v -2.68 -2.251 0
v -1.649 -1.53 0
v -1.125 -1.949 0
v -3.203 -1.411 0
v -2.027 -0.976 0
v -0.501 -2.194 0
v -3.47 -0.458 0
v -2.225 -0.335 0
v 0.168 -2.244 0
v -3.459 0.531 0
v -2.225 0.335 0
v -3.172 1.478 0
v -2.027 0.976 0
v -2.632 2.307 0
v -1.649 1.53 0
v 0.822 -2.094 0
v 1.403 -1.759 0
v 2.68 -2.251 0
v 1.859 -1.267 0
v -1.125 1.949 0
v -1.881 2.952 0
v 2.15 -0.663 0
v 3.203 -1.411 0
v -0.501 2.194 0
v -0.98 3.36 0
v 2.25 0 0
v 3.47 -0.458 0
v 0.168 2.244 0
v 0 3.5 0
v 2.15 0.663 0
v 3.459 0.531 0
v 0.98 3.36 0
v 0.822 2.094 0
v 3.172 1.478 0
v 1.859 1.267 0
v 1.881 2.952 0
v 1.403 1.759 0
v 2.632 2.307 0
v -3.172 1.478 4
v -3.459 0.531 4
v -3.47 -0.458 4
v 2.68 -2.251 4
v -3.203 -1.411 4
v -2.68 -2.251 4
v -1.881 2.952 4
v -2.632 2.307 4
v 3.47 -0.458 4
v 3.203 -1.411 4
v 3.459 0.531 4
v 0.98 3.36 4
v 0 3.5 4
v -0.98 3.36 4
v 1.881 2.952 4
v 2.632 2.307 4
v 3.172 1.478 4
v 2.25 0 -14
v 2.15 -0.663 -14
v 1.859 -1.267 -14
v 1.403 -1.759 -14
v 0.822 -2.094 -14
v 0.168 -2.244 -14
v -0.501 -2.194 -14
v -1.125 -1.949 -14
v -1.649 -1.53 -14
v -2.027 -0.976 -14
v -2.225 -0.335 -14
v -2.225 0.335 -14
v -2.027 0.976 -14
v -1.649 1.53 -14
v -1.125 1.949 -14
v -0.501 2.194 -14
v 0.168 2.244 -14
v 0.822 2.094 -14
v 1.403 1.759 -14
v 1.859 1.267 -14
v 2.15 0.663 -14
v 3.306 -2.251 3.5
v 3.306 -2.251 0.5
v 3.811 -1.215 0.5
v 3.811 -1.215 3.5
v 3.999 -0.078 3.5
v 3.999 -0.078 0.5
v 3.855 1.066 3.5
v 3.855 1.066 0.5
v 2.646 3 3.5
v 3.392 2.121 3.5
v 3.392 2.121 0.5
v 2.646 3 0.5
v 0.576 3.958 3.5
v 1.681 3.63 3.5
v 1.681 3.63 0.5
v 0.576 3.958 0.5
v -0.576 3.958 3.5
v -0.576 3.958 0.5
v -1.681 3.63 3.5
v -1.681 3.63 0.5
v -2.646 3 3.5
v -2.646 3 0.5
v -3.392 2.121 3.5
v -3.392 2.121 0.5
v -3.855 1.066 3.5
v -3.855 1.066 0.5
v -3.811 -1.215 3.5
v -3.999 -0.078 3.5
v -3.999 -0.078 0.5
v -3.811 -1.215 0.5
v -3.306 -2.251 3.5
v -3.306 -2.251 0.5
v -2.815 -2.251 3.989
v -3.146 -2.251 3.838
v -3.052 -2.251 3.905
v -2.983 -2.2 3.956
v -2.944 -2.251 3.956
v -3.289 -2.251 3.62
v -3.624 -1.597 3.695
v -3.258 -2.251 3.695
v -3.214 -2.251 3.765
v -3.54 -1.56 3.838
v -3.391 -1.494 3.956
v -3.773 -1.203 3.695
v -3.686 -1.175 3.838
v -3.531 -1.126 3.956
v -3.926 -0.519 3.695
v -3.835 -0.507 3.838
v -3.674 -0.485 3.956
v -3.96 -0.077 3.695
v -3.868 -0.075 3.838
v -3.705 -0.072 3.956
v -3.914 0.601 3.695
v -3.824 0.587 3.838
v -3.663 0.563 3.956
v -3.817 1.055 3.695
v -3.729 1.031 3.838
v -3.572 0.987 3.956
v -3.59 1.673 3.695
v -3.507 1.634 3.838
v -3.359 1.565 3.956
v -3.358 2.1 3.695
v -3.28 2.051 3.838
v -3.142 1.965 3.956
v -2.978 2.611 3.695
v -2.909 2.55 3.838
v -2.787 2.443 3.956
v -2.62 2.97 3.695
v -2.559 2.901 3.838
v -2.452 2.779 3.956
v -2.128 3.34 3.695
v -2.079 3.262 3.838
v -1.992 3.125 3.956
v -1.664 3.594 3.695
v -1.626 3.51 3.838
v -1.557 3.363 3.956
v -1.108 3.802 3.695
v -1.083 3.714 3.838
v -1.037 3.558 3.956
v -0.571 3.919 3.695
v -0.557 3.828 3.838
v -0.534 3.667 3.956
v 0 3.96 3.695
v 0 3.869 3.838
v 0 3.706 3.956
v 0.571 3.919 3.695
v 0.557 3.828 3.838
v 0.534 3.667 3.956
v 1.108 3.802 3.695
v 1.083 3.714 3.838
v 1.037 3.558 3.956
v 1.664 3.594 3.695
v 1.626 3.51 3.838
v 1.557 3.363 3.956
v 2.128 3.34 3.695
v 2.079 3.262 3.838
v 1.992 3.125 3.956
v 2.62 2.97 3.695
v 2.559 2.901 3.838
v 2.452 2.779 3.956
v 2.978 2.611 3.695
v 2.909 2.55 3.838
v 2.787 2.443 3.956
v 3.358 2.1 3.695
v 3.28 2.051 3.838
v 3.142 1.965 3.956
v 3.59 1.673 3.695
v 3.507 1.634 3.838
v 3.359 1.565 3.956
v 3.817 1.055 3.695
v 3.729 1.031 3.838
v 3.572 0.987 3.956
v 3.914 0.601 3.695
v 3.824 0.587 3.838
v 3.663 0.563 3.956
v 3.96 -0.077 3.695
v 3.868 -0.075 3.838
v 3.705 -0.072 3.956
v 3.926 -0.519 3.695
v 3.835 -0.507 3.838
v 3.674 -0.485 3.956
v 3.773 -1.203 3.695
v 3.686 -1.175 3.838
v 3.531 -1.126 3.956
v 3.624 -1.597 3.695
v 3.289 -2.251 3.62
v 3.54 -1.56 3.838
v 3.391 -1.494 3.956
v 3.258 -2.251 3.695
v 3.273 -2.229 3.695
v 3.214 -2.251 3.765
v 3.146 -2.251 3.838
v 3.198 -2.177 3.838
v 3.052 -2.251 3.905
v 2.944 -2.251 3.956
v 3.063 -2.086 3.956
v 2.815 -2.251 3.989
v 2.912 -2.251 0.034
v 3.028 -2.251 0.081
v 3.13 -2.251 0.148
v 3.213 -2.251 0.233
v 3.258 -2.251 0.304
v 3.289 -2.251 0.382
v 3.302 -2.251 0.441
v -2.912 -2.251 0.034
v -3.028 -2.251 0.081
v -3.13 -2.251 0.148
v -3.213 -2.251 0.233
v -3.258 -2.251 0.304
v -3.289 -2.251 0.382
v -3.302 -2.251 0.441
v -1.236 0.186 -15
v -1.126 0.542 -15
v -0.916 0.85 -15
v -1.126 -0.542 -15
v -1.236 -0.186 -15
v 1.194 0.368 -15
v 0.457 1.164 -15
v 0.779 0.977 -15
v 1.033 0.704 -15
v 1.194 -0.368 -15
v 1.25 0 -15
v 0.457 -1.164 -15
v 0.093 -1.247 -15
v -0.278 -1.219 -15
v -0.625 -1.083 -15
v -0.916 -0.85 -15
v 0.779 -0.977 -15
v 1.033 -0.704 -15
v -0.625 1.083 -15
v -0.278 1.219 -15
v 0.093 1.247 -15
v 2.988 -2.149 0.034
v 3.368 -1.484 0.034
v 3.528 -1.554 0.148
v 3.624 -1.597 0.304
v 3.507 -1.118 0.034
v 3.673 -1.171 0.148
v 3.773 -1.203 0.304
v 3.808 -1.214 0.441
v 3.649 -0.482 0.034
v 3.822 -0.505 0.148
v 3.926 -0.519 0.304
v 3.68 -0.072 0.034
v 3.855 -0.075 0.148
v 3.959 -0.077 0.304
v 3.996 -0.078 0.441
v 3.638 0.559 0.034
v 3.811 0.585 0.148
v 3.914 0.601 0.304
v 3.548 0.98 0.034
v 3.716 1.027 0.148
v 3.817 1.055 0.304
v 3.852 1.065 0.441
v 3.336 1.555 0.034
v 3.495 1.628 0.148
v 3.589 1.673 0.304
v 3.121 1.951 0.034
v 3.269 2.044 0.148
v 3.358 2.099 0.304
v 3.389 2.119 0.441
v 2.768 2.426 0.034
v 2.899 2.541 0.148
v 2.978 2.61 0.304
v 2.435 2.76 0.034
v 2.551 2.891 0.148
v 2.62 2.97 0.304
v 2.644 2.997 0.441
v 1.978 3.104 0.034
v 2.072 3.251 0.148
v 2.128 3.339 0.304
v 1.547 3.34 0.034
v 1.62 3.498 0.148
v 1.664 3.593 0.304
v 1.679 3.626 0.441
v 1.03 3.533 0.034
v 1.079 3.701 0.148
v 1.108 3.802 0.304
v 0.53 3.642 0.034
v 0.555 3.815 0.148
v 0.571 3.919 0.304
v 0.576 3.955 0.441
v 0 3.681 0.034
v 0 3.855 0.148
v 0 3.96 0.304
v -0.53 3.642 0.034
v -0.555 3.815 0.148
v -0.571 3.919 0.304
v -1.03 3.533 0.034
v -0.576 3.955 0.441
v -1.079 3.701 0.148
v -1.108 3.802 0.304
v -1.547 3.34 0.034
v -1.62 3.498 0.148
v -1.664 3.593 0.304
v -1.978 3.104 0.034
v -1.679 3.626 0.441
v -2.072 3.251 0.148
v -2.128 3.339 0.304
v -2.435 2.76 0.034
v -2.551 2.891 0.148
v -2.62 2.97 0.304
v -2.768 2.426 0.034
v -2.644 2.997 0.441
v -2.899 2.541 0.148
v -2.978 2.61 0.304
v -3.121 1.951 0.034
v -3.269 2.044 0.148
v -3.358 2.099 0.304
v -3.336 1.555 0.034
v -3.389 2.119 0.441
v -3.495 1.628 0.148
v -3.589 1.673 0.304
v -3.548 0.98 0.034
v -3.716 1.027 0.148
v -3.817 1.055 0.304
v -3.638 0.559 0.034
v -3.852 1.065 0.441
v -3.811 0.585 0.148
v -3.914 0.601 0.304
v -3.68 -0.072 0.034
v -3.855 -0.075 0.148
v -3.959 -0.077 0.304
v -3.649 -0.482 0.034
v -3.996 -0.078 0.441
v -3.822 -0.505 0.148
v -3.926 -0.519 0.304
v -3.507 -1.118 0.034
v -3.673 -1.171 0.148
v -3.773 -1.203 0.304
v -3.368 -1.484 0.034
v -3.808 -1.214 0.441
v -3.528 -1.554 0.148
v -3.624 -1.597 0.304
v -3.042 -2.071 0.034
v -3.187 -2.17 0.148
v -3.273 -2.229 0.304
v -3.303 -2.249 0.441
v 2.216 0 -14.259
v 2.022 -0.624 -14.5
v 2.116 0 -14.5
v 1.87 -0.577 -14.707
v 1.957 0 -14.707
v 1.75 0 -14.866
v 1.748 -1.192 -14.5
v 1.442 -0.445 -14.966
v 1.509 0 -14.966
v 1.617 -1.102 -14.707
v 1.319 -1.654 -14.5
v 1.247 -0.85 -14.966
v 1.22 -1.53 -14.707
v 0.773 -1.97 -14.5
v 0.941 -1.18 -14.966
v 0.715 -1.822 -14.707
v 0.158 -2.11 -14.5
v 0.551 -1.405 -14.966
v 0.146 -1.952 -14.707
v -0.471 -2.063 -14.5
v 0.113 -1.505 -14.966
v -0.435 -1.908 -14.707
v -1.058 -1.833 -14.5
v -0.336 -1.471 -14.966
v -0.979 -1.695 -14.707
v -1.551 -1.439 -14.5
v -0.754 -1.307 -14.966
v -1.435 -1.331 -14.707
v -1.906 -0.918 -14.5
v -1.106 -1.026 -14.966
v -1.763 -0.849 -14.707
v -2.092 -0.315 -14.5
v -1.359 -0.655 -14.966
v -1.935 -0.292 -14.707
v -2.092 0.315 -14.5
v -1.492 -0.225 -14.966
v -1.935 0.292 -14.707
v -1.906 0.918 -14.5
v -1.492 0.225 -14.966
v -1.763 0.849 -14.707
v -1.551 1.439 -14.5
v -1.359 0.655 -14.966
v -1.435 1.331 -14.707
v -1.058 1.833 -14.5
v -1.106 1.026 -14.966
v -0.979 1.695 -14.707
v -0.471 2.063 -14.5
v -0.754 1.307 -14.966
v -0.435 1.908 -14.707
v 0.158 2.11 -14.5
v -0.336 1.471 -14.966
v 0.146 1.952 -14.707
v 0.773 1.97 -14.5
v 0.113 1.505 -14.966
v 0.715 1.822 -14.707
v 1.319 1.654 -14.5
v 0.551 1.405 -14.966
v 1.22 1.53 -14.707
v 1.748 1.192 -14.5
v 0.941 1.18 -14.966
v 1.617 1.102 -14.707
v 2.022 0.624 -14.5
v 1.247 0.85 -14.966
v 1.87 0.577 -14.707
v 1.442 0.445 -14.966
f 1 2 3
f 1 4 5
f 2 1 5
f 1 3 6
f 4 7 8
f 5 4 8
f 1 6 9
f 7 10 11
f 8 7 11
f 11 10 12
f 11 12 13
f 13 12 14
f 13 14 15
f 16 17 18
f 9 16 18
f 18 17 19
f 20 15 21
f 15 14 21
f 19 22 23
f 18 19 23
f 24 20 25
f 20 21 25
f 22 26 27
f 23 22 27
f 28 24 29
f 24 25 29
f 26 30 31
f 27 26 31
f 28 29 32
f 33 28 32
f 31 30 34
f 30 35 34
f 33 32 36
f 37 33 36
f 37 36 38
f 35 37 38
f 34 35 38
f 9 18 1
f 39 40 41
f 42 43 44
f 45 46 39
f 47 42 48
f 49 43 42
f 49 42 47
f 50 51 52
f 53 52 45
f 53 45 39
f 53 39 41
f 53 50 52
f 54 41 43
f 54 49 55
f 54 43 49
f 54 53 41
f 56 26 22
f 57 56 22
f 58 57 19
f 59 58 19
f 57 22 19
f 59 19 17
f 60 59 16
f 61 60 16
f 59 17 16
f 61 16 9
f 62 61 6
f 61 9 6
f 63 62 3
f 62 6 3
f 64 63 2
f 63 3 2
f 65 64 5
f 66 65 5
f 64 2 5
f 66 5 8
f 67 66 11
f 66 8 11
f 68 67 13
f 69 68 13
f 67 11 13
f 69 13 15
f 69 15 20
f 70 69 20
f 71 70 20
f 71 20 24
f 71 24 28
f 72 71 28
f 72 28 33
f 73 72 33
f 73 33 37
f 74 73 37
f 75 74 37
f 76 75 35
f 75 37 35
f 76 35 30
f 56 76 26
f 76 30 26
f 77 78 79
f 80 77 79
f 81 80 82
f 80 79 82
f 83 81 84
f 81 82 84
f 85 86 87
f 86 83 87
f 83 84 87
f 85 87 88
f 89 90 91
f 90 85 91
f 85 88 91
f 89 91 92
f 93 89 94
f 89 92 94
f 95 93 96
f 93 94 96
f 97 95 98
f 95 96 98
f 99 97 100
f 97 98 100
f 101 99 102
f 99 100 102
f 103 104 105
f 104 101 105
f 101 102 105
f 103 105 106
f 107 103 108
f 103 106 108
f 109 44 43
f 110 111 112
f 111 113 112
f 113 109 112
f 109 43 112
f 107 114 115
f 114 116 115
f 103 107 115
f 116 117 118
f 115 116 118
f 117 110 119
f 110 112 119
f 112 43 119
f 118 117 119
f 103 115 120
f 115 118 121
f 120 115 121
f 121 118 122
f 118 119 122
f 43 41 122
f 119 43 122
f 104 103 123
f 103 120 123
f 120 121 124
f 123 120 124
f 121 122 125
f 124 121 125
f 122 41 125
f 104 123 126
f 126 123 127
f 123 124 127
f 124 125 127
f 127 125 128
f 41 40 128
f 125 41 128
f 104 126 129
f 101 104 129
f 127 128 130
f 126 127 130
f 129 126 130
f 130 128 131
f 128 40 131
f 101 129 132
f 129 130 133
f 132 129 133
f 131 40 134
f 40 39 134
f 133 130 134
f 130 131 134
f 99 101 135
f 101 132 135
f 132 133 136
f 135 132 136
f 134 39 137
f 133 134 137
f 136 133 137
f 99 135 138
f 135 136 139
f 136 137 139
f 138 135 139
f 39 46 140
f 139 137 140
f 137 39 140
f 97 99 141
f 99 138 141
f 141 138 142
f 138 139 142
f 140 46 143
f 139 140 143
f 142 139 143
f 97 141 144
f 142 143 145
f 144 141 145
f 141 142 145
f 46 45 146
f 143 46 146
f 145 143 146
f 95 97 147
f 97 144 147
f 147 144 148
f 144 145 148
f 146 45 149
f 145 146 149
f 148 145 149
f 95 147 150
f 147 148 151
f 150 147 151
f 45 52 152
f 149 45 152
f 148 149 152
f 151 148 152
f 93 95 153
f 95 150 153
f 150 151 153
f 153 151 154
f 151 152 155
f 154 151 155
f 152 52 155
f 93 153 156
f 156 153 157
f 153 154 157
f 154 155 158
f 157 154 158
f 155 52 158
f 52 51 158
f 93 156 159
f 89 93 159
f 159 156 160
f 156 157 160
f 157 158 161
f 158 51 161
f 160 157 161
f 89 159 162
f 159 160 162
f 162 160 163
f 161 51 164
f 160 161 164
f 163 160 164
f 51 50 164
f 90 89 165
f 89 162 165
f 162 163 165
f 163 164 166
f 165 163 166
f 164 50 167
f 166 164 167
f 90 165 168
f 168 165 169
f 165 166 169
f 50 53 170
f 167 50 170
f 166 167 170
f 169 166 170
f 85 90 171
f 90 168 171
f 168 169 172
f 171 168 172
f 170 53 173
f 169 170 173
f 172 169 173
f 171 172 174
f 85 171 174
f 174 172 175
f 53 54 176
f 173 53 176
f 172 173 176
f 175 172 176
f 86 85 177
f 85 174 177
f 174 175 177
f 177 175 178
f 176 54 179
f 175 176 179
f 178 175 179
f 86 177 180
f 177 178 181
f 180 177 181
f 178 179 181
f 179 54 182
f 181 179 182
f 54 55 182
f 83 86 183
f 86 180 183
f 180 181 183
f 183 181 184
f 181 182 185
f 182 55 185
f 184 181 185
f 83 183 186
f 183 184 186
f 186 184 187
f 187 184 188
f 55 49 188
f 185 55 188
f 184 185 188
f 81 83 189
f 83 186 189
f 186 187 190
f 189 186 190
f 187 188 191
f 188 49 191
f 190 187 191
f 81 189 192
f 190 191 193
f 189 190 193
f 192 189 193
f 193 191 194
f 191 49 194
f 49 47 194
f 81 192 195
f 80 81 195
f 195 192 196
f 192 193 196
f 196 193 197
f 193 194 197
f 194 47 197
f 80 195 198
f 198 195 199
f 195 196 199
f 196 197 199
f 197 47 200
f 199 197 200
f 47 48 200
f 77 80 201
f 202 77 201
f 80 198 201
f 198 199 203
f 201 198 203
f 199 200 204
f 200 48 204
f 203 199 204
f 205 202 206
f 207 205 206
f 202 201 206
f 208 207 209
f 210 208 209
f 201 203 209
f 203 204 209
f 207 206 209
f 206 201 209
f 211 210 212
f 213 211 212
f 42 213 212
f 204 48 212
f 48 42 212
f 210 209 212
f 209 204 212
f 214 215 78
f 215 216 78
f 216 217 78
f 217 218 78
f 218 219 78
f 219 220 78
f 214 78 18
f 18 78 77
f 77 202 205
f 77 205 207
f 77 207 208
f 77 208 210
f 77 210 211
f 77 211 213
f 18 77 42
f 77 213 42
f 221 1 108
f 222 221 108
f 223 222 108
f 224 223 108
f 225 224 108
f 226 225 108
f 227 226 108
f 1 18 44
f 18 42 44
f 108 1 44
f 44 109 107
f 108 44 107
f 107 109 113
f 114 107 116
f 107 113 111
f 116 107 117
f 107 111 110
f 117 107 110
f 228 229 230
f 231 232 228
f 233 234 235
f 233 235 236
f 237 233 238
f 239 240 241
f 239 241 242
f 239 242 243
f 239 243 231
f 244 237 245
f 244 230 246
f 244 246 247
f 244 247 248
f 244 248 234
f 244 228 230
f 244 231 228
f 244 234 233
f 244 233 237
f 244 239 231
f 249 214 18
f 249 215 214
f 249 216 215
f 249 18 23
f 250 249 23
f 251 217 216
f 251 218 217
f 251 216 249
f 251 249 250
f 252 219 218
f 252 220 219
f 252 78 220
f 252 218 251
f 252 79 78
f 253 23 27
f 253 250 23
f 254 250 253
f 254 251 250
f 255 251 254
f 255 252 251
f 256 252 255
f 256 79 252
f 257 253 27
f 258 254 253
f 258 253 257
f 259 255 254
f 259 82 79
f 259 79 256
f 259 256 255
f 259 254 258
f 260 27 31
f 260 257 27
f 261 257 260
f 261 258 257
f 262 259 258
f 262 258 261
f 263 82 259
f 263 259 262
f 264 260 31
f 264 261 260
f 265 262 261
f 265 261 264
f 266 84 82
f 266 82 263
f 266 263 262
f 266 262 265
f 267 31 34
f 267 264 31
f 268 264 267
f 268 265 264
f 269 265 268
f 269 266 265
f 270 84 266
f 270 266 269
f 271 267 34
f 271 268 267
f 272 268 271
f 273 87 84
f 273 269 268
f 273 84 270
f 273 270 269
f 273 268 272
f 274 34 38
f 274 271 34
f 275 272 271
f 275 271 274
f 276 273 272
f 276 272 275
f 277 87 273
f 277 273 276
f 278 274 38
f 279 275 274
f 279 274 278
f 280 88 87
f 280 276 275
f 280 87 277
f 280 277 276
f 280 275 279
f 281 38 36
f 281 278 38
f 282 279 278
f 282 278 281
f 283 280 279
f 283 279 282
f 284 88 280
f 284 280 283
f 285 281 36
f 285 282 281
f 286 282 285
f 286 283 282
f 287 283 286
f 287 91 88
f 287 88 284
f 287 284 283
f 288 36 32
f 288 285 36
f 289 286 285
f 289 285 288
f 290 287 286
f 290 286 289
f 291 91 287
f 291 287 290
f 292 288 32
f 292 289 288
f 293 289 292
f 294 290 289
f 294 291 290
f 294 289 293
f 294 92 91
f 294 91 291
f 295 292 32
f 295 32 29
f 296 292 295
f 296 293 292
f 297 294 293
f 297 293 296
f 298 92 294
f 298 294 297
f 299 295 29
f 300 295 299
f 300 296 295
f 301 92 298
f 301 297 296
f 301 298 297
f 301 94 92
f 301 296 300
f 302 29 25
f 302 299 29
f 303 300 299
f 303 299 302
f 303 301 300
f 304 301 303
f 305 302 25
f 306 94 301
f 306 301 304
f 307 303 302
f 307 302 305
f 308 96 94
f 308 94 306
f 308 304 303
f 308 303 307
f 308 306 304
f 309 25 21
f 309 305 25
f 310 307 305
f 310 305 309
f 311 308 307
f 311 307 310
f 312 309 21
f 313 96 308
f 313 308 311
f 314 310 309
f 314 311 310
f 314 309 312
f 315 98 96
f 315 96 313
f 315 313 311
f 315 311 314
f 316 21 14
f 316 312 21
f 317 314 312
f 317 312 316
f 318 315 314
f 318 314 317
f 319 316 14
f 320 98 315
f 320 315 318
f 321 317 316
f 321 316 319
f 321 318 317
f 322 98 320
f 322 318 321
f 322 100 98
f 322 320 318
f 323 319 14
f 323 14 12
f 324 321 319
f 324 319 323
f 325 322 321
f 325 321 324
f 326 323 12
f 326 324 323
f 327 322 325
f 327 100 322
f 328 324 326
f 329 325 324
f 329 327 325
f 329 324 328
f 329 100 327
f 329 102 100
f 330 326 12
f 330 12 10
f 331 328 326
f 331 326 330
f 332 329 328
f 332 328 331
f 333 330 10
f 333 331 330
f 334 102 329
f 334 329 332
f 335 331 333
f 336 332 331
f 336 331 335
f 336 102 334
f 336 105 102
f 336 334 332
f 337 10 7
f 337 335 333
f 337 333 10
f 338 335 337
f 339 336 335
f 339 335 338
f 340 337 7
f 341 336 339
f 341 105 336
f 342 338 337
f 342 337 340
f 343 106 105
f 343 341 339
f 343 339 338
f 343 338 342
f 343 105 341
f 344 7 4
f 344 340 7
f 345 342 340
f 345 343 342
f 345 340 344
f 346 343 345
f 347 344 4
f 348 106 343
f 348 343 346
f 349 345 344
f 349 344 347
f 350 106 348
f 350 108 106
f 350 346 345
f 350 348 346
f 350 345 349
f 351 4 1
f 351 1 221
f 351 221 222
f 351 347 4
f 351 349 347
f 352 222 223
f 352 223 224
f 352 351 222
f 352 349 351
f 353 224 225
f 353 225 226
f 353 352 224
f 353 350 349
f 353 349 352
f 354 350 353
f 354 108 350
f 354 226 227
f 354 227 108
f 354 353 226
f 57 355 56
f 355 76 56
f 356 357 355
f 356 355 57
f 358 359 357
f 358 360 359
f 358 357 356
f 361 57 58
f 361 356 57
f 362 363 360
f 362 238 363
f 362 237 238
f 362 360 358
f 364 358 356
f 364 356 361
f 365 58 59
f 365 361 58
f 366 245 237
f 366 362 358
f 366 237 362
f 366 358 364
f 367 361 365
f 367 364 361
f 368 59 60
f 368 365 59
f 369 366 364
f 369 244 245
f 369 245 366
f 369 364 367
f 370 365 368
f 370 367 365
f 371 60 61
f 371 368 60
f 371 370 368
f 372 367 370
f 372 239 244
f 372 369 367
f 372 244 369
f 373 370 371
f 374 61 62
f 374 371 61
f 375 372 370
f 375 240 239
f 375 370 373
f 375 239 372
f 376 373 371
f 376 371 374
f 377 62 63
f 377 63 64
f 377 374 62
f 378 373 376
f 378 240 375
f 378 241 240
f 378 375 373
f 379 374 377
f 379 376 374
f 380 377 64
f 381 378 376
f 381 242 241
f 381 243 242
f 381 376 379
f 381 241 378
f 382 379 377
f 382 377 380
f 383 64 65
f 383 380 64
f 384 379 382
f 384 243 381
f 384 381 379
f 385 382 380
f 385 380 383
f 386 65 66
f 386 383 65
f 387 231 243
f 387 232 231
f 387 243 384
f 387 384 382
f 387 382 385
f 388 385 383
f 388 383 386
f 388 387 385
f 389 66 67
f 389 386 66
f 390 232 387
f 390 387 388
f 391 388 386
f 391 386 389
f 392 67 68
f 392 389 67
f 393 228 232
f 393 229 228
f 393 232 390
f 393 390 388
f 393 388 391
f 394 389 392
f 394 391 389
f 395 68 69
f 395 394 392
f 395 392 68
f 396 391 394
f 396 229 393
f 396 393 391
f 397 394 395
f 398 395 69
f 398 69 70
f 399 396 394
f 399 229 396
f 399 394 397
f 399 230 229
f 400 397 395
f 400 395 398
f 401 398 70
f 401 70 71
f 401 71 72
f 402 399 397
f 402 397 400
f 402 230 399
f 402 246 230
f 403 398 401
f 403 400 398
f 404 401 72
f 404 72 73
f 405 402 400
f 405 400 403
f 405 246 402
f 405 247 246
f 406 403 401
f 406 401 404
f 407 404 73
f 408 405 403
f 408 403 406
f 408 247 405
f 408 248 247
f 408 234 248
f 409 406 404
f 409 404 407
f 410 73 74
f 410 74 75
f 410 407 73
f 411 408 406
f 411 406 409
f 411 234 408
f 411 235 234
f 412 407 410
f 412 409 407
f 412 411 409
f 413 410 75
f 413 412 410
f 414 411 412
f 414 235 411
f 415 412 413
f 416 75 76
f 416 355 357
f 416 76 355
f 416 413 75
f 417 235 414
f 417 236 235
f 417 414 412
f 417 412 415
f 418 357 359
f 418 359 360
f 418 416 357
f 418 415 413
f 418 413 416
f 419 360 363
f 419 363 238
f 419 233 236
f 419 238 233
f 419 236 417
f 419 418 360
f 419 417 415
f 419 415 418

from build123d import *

# Parameters (mm, degrees)
F0_R     = 4
F1_DEPTH = 4
F2_R     = 2.25
F3_DEPTH = 15
F5_DEPTH = 4
F6_R     = 1
F7_R     = 0.5


with BuildPart() as f1:
    # F0 (on Top) → F1 (new body)
    with BuildSketch(Plane.XY):
        Circle(F0_R)
    extrude(amount=F1_DEPTH)

    # F2 (on face) → F3 (join)
    with BuildSketch(Plane(origin=(0, 0, 0), x_dir=(1, 0, 0), z_dir=(0, 0, -1))):
        Circle(F2_R)
    extrude(amount=F3_DEPTH)

    # F4 (on face) → F5 (cut)
    with BuildSketch(Plane.XY.offset(4)):
        Polygon((5.111386, -2.251241), (-4.930368, -2.251241), (-2.237212, -4.44078), (3.483612, -4.44078), align=None)
    extrude(amount=-F5_DEPTH, mode=Mode.SUBTRACT)

    # F6
    f6_edges = [f1.edges().sort_by_distance(p)[0] for p in [
        (-2.25, 0, -15),
    ]]
    fillet(f6_edges, radius=F6_R)

    # F7
    f7_edges = [f1.edges().sort_by_distance(p)[0] for p in [
        (0, 4, 0),
        (0, 4, 4),
    ]]
    fillet(f7_edges, radius=F7_R)


solid = f1.part
